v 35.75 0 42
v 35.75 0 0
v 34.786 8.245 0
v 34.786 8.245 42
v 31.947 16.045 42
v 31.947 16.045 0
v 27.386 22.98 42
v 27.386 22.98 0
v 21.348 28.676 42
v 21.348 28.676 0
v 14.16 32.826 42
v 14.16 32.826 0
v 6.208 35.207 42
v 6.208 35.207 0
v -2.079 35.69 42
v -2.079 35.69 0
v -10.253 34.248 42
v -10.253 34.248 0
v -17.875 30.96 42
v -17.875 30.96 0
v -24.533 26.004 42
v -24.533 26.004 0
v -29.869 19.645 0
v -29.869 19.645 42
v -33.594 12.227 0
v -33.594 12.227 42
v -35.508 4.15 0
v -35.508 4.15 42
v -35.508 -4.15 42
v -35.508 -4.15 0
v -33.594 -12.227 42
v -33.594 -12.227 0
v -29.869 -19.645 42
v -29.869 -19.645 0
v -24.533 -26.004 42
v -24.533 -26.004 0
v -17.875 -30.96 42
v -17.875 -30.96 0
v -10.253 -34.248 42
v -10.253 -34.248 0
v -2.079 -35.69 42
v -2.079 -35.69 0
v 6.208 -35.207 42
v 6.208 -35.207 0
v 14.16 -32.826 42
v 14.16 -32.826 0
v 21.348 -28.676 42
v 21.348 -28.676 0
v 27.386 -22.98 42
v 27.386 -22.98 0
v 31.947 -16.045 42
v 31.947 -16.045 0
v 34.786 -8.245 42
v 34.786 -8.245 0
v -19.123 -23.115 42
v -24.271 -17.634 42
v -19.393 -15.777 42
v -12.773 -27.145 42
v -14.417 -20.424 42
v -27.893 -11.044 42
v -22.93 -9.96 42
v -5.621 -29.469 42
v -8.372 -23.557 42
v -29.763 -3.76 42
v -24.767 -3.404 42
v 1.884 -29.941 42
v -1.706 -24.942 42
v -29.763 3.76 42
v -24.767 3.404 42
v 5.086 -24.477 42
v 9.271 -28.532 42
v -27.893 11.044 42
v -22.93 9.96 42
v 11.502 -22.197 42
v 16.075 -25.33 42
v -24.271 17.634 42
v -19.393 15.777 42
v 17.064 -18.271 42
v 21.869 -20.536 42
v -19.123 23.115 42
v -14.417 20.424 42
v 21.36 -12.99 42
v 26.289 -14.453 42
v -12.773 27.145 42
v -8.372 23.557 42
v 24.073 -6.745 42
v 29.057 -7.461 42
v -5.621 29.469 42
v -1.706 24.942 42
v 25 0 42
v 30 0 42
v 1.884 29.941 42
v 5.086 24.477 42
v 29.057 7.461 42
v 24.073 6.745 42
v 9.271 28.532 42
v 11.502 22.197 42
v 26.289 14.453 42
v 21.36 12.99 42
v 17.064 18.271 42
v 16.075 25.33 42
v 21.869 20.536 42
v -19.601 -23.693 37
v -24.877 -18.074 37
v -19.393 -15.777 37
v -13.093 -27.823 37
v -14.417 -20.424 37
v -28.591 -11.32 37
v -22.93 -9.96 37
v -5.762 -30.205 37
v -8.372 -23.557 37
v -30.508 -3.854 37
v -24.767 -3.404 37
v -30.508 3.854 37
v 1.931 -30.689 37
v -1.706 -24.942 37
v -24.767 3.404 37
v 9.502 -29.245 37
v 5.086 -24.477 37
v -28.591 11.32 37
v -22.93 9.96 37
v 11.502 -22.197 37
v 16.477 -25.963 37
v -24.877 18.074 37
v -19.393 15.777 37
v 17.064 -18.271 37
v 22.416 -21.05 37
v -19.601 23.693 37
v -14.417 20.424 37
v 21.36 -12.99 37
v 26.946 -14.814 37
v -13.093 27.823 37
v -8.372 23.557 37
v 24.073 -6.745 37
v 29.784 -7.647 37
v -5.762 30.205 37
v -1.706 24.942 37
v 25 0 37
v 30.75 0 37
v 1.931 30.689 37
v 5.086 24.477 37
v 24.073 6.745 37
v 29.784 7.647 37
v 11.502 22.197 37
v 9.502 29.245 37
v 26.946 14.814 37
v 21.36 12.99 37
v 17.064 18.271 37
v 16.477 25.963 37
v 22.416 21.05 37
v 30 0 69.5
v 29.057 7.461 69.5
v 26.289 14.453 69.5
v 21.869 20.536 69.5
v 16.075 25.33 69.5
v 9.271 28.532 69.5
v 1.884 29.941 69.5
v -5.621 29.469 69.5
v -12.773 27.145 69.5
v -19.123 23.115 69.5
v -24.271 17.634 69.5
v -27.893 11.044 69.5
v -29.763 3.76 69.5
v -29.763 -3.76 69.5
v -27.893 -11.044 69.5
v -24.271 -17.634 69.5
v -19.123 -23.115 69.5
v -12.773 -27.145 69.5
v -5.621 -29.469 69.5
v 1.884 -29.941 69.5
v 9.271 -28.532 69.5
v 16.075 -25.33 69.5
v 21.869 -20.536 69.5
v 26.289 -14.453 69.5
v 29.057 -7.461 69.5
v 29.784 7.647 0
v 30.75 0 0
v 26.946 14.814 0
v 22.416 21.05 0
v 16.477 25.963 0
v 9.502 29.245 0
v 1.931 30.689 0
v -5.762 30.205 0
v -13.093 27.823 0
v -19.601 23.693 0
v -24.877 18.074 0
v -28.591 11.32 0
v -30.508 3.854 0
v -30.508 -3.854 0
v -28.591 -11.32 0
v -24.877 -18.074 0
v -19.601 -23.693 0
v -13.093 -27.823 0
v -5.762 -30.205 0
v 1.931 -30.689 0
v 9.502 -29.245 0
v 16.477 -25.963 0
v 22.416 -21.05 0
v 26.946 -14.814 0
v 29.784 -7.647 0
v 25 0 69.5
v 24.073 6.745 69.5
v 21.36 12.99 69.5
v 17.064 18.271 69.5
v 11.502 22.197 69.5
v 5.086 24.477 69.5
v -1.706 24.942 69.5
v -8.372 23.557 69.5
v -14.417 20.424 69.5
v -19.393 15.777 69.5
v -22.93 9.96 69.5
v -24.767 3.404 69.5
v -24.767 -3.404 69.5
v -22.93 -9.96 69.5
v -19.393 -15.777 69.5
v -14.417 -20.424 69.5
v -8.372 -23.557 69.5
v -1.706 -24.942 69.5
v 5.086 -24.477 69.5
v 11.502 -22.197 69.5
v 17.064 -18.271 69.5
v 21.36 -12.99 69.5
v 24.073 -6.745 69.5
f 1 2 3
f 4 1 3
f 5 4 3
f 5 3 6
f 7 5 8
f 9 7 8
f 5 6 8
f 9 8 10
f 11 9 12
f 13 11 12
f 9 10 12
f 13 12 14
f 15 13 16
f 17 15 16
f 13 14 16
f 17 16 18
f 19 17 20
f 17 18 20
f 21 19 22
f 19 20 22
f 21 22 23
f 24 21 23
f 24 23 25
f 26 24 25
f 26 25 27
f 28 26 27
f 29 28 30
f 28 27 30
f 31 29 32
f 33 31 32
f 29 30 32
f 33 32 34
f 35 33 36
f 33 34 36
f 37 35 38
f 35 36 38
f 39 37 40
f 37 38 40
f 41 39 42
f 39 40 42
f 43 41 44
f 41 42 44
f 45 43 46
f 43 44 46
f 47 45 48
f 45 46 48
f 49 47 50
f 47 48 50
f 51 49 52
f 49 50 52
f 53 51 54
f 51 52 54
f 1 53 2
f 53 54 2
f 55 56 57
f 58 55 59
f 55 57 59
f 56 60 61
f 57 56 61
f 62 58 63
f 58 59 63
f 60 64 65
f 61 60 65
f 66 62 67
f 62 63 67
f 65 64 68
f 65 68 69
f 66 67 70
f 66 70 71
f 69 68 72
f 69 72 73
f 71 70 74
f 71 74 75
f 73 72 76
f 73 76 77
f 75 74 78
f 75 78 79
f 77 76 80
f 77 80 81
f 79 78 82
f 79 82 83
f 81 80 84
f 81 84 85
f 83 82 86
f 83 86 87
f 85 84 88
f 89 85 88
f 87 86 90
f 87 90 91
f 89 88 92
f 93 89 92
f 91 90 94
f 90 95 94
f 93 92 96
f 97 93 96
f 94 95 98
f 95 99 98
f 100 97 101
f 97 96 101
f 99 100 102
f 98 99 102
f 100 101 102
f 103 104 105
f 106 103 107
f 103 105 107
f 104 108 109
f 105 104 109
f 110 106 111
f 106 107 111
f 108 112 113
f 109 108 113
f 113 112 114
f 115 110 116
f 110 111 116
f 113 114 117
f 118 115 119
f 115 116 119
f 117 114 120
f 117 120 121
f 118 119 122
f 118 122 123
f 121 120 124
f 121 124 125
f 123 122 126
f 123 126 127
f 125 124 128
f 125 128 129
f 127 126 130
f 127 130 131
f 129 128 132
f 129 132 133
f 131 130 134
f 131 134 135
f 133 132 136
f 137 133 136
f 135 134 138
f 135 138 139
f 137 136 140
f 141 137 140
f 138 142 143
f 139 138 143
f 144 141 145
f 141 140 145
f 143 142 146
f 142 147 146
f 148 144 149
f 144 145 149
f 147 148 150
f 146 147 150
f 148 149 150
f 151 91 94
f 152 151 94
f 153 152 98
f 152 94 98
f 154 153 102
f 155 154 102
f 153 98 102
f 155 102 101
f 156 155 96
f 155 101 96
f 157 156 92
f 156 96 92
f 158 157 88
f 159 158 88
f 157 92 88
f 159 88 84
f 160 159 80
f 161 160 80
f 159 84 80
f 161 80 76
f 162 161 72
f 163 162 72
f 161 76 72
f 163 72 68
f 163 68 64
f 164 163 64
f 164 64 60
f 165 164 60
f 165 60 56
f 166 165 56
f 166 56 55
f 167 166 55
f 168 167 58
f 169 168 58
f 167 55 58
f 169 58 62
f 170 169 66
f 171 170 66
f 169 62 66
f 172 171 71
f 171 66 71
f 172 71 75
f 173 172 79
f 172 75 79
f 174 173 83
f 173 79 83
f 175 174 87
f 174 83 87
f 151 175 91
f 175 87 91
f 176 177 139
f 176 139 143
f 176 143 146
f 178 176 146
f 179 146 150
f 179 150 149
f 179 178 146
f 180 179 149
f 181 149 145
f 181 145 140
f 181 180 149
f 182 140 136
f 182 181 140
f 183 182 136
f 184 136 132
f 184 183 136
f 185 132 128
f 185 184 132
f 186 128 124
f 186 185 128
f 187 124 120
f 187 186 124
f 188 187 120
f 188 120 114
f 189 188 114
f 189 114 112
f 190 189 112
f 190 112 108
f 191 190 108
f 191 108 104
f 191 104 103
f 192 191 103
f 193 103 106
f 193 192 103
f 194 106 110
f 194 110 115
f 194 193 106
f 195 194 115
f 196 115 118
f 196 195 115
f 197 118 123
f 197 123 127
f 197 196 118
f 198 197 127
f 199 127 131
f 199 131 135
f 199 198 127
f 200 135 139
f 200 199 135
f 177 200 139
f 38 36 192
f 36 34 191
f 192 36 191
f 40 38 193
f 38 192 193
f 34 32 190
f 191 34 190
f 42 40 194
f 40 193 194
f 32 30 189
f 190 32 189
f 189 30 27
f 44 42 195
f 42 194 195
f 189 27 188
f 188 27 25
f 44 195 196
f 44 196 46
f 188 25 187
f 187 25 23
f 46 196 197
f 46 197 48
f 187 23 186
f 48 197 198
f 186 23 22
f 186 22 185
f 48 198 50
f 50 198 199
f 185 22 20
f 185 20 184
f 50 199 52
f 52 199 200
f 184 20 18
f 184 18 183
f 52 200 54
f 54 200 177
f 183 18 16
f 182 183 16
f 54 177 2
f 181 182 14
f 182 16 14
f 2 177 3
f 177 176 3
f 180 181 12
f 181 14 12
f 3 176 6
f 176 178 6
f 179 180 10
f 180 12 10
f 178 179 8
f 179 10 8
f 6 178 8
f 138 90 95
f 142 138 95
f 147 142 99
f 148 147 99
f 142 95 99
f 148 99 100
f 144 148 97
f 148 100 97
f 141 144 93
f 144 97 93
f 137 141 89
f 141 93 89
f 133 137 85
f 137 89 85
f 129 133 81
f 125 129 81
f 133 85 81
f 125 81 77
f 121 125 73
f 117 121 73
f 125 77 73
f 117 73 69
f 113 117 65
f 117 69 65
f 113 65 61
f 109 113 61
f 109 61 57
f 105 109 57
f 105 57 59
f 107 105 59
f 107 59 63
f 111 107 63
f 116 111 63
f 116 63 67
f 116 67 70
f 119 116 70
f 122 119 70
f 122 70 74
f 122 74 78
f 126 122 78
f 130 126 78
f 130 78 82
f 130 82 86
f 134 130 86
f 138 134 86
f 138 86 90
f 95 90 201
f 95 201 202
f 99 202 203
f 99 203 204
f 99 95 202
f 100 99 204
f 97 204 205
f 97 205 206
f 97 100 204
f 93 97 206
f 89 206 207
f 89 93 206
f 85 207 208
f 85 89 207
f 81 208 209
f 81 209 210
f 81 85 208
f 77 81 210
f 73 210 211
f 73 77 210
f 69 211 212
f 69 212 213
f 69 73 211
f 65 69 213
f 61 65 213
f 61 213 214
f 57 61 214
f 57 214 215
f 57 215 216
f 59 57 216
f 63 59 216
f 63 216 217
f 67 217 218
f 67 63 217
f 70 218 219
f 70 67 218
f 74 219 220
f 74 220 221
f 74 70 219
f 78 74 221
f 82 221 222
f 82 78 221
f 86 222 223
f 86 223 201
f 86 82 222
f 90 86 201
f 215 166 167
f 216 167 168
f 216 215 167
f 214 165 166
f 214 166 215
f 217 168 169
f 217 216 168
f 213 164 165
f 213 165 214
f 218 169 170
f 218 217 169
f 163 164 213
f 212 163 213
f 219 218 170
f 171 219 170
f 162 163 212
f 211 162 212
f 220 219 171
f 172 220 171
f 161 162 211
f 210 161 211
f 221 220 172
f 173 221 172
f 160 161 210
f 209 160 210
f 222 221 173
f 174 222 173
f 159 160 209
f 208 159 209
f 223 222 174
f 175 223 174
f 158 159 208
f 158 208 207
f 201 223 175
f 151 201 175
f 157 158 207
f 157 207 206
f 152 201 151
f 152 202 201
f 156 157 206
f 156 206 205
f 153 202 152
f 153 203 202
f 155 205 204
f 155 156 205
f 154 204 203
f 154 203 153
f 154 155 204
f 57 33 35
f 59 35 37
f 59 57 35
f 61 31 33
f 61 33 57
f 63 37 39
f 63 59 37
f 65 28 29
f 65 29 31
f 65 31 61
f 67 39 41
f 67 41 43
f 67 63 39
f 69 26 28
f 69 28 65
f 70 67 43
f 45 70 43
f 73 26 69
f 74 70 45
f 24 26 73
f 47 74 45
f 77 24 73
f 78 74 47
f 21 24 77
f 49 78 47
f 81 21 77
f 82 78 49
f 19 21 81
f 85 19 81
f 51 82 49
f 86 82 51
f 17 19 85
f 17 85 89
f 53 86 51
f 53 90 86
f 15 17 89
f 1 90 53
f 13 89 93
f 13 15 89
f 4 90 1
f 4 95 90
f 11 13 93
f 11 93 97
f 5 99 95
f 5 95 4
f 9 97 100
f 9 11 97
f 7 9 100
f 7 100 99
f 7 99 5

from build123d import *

# Parameters (mm, degrees)
F1_R     = 35.75
F2_DEPTH = 42
F0_R     = 30.75
F3_DEPTH = 37
F5_R     = 30
F5_R_2   = 25
F6_DEPTH = 27.5
F4_R     = 25
F7_DEPTH = 25


with BuildPart() as f2:
    # F1 (on Top) → F2 (new body)
    with BuildSketch(Plane.XY):
        Circle(F1_R)
    extrude(amount=F2_DEPTH)

    # F0 (on Top) → F3 (cut)
    with BuildSketch(Plane.XY):
        Circle(F0_R)
    extrude(amount=F3_DEPTH, mode=Mode.SUBTRACT)

    # F4 (on face) → F7 (cut)
    with BuildSketch(Plane.XY.offset(42)):
        Circle(F4_R)
    extrude(amount=-F7_DEPTH, mode=Mode.SUBTRACT)


with BuildPart() as f6:
    # F5 (on face) → F6 (new body)
    with BuildSketch(Plane.XY.offset(42)):
        Circle(F5_R)
        Circle(F5_R_2, mode=Mode.SUBTRACT)
    extrude(amount=F6_DEPTH)


solid = Compound([f2.part, f6.part])
